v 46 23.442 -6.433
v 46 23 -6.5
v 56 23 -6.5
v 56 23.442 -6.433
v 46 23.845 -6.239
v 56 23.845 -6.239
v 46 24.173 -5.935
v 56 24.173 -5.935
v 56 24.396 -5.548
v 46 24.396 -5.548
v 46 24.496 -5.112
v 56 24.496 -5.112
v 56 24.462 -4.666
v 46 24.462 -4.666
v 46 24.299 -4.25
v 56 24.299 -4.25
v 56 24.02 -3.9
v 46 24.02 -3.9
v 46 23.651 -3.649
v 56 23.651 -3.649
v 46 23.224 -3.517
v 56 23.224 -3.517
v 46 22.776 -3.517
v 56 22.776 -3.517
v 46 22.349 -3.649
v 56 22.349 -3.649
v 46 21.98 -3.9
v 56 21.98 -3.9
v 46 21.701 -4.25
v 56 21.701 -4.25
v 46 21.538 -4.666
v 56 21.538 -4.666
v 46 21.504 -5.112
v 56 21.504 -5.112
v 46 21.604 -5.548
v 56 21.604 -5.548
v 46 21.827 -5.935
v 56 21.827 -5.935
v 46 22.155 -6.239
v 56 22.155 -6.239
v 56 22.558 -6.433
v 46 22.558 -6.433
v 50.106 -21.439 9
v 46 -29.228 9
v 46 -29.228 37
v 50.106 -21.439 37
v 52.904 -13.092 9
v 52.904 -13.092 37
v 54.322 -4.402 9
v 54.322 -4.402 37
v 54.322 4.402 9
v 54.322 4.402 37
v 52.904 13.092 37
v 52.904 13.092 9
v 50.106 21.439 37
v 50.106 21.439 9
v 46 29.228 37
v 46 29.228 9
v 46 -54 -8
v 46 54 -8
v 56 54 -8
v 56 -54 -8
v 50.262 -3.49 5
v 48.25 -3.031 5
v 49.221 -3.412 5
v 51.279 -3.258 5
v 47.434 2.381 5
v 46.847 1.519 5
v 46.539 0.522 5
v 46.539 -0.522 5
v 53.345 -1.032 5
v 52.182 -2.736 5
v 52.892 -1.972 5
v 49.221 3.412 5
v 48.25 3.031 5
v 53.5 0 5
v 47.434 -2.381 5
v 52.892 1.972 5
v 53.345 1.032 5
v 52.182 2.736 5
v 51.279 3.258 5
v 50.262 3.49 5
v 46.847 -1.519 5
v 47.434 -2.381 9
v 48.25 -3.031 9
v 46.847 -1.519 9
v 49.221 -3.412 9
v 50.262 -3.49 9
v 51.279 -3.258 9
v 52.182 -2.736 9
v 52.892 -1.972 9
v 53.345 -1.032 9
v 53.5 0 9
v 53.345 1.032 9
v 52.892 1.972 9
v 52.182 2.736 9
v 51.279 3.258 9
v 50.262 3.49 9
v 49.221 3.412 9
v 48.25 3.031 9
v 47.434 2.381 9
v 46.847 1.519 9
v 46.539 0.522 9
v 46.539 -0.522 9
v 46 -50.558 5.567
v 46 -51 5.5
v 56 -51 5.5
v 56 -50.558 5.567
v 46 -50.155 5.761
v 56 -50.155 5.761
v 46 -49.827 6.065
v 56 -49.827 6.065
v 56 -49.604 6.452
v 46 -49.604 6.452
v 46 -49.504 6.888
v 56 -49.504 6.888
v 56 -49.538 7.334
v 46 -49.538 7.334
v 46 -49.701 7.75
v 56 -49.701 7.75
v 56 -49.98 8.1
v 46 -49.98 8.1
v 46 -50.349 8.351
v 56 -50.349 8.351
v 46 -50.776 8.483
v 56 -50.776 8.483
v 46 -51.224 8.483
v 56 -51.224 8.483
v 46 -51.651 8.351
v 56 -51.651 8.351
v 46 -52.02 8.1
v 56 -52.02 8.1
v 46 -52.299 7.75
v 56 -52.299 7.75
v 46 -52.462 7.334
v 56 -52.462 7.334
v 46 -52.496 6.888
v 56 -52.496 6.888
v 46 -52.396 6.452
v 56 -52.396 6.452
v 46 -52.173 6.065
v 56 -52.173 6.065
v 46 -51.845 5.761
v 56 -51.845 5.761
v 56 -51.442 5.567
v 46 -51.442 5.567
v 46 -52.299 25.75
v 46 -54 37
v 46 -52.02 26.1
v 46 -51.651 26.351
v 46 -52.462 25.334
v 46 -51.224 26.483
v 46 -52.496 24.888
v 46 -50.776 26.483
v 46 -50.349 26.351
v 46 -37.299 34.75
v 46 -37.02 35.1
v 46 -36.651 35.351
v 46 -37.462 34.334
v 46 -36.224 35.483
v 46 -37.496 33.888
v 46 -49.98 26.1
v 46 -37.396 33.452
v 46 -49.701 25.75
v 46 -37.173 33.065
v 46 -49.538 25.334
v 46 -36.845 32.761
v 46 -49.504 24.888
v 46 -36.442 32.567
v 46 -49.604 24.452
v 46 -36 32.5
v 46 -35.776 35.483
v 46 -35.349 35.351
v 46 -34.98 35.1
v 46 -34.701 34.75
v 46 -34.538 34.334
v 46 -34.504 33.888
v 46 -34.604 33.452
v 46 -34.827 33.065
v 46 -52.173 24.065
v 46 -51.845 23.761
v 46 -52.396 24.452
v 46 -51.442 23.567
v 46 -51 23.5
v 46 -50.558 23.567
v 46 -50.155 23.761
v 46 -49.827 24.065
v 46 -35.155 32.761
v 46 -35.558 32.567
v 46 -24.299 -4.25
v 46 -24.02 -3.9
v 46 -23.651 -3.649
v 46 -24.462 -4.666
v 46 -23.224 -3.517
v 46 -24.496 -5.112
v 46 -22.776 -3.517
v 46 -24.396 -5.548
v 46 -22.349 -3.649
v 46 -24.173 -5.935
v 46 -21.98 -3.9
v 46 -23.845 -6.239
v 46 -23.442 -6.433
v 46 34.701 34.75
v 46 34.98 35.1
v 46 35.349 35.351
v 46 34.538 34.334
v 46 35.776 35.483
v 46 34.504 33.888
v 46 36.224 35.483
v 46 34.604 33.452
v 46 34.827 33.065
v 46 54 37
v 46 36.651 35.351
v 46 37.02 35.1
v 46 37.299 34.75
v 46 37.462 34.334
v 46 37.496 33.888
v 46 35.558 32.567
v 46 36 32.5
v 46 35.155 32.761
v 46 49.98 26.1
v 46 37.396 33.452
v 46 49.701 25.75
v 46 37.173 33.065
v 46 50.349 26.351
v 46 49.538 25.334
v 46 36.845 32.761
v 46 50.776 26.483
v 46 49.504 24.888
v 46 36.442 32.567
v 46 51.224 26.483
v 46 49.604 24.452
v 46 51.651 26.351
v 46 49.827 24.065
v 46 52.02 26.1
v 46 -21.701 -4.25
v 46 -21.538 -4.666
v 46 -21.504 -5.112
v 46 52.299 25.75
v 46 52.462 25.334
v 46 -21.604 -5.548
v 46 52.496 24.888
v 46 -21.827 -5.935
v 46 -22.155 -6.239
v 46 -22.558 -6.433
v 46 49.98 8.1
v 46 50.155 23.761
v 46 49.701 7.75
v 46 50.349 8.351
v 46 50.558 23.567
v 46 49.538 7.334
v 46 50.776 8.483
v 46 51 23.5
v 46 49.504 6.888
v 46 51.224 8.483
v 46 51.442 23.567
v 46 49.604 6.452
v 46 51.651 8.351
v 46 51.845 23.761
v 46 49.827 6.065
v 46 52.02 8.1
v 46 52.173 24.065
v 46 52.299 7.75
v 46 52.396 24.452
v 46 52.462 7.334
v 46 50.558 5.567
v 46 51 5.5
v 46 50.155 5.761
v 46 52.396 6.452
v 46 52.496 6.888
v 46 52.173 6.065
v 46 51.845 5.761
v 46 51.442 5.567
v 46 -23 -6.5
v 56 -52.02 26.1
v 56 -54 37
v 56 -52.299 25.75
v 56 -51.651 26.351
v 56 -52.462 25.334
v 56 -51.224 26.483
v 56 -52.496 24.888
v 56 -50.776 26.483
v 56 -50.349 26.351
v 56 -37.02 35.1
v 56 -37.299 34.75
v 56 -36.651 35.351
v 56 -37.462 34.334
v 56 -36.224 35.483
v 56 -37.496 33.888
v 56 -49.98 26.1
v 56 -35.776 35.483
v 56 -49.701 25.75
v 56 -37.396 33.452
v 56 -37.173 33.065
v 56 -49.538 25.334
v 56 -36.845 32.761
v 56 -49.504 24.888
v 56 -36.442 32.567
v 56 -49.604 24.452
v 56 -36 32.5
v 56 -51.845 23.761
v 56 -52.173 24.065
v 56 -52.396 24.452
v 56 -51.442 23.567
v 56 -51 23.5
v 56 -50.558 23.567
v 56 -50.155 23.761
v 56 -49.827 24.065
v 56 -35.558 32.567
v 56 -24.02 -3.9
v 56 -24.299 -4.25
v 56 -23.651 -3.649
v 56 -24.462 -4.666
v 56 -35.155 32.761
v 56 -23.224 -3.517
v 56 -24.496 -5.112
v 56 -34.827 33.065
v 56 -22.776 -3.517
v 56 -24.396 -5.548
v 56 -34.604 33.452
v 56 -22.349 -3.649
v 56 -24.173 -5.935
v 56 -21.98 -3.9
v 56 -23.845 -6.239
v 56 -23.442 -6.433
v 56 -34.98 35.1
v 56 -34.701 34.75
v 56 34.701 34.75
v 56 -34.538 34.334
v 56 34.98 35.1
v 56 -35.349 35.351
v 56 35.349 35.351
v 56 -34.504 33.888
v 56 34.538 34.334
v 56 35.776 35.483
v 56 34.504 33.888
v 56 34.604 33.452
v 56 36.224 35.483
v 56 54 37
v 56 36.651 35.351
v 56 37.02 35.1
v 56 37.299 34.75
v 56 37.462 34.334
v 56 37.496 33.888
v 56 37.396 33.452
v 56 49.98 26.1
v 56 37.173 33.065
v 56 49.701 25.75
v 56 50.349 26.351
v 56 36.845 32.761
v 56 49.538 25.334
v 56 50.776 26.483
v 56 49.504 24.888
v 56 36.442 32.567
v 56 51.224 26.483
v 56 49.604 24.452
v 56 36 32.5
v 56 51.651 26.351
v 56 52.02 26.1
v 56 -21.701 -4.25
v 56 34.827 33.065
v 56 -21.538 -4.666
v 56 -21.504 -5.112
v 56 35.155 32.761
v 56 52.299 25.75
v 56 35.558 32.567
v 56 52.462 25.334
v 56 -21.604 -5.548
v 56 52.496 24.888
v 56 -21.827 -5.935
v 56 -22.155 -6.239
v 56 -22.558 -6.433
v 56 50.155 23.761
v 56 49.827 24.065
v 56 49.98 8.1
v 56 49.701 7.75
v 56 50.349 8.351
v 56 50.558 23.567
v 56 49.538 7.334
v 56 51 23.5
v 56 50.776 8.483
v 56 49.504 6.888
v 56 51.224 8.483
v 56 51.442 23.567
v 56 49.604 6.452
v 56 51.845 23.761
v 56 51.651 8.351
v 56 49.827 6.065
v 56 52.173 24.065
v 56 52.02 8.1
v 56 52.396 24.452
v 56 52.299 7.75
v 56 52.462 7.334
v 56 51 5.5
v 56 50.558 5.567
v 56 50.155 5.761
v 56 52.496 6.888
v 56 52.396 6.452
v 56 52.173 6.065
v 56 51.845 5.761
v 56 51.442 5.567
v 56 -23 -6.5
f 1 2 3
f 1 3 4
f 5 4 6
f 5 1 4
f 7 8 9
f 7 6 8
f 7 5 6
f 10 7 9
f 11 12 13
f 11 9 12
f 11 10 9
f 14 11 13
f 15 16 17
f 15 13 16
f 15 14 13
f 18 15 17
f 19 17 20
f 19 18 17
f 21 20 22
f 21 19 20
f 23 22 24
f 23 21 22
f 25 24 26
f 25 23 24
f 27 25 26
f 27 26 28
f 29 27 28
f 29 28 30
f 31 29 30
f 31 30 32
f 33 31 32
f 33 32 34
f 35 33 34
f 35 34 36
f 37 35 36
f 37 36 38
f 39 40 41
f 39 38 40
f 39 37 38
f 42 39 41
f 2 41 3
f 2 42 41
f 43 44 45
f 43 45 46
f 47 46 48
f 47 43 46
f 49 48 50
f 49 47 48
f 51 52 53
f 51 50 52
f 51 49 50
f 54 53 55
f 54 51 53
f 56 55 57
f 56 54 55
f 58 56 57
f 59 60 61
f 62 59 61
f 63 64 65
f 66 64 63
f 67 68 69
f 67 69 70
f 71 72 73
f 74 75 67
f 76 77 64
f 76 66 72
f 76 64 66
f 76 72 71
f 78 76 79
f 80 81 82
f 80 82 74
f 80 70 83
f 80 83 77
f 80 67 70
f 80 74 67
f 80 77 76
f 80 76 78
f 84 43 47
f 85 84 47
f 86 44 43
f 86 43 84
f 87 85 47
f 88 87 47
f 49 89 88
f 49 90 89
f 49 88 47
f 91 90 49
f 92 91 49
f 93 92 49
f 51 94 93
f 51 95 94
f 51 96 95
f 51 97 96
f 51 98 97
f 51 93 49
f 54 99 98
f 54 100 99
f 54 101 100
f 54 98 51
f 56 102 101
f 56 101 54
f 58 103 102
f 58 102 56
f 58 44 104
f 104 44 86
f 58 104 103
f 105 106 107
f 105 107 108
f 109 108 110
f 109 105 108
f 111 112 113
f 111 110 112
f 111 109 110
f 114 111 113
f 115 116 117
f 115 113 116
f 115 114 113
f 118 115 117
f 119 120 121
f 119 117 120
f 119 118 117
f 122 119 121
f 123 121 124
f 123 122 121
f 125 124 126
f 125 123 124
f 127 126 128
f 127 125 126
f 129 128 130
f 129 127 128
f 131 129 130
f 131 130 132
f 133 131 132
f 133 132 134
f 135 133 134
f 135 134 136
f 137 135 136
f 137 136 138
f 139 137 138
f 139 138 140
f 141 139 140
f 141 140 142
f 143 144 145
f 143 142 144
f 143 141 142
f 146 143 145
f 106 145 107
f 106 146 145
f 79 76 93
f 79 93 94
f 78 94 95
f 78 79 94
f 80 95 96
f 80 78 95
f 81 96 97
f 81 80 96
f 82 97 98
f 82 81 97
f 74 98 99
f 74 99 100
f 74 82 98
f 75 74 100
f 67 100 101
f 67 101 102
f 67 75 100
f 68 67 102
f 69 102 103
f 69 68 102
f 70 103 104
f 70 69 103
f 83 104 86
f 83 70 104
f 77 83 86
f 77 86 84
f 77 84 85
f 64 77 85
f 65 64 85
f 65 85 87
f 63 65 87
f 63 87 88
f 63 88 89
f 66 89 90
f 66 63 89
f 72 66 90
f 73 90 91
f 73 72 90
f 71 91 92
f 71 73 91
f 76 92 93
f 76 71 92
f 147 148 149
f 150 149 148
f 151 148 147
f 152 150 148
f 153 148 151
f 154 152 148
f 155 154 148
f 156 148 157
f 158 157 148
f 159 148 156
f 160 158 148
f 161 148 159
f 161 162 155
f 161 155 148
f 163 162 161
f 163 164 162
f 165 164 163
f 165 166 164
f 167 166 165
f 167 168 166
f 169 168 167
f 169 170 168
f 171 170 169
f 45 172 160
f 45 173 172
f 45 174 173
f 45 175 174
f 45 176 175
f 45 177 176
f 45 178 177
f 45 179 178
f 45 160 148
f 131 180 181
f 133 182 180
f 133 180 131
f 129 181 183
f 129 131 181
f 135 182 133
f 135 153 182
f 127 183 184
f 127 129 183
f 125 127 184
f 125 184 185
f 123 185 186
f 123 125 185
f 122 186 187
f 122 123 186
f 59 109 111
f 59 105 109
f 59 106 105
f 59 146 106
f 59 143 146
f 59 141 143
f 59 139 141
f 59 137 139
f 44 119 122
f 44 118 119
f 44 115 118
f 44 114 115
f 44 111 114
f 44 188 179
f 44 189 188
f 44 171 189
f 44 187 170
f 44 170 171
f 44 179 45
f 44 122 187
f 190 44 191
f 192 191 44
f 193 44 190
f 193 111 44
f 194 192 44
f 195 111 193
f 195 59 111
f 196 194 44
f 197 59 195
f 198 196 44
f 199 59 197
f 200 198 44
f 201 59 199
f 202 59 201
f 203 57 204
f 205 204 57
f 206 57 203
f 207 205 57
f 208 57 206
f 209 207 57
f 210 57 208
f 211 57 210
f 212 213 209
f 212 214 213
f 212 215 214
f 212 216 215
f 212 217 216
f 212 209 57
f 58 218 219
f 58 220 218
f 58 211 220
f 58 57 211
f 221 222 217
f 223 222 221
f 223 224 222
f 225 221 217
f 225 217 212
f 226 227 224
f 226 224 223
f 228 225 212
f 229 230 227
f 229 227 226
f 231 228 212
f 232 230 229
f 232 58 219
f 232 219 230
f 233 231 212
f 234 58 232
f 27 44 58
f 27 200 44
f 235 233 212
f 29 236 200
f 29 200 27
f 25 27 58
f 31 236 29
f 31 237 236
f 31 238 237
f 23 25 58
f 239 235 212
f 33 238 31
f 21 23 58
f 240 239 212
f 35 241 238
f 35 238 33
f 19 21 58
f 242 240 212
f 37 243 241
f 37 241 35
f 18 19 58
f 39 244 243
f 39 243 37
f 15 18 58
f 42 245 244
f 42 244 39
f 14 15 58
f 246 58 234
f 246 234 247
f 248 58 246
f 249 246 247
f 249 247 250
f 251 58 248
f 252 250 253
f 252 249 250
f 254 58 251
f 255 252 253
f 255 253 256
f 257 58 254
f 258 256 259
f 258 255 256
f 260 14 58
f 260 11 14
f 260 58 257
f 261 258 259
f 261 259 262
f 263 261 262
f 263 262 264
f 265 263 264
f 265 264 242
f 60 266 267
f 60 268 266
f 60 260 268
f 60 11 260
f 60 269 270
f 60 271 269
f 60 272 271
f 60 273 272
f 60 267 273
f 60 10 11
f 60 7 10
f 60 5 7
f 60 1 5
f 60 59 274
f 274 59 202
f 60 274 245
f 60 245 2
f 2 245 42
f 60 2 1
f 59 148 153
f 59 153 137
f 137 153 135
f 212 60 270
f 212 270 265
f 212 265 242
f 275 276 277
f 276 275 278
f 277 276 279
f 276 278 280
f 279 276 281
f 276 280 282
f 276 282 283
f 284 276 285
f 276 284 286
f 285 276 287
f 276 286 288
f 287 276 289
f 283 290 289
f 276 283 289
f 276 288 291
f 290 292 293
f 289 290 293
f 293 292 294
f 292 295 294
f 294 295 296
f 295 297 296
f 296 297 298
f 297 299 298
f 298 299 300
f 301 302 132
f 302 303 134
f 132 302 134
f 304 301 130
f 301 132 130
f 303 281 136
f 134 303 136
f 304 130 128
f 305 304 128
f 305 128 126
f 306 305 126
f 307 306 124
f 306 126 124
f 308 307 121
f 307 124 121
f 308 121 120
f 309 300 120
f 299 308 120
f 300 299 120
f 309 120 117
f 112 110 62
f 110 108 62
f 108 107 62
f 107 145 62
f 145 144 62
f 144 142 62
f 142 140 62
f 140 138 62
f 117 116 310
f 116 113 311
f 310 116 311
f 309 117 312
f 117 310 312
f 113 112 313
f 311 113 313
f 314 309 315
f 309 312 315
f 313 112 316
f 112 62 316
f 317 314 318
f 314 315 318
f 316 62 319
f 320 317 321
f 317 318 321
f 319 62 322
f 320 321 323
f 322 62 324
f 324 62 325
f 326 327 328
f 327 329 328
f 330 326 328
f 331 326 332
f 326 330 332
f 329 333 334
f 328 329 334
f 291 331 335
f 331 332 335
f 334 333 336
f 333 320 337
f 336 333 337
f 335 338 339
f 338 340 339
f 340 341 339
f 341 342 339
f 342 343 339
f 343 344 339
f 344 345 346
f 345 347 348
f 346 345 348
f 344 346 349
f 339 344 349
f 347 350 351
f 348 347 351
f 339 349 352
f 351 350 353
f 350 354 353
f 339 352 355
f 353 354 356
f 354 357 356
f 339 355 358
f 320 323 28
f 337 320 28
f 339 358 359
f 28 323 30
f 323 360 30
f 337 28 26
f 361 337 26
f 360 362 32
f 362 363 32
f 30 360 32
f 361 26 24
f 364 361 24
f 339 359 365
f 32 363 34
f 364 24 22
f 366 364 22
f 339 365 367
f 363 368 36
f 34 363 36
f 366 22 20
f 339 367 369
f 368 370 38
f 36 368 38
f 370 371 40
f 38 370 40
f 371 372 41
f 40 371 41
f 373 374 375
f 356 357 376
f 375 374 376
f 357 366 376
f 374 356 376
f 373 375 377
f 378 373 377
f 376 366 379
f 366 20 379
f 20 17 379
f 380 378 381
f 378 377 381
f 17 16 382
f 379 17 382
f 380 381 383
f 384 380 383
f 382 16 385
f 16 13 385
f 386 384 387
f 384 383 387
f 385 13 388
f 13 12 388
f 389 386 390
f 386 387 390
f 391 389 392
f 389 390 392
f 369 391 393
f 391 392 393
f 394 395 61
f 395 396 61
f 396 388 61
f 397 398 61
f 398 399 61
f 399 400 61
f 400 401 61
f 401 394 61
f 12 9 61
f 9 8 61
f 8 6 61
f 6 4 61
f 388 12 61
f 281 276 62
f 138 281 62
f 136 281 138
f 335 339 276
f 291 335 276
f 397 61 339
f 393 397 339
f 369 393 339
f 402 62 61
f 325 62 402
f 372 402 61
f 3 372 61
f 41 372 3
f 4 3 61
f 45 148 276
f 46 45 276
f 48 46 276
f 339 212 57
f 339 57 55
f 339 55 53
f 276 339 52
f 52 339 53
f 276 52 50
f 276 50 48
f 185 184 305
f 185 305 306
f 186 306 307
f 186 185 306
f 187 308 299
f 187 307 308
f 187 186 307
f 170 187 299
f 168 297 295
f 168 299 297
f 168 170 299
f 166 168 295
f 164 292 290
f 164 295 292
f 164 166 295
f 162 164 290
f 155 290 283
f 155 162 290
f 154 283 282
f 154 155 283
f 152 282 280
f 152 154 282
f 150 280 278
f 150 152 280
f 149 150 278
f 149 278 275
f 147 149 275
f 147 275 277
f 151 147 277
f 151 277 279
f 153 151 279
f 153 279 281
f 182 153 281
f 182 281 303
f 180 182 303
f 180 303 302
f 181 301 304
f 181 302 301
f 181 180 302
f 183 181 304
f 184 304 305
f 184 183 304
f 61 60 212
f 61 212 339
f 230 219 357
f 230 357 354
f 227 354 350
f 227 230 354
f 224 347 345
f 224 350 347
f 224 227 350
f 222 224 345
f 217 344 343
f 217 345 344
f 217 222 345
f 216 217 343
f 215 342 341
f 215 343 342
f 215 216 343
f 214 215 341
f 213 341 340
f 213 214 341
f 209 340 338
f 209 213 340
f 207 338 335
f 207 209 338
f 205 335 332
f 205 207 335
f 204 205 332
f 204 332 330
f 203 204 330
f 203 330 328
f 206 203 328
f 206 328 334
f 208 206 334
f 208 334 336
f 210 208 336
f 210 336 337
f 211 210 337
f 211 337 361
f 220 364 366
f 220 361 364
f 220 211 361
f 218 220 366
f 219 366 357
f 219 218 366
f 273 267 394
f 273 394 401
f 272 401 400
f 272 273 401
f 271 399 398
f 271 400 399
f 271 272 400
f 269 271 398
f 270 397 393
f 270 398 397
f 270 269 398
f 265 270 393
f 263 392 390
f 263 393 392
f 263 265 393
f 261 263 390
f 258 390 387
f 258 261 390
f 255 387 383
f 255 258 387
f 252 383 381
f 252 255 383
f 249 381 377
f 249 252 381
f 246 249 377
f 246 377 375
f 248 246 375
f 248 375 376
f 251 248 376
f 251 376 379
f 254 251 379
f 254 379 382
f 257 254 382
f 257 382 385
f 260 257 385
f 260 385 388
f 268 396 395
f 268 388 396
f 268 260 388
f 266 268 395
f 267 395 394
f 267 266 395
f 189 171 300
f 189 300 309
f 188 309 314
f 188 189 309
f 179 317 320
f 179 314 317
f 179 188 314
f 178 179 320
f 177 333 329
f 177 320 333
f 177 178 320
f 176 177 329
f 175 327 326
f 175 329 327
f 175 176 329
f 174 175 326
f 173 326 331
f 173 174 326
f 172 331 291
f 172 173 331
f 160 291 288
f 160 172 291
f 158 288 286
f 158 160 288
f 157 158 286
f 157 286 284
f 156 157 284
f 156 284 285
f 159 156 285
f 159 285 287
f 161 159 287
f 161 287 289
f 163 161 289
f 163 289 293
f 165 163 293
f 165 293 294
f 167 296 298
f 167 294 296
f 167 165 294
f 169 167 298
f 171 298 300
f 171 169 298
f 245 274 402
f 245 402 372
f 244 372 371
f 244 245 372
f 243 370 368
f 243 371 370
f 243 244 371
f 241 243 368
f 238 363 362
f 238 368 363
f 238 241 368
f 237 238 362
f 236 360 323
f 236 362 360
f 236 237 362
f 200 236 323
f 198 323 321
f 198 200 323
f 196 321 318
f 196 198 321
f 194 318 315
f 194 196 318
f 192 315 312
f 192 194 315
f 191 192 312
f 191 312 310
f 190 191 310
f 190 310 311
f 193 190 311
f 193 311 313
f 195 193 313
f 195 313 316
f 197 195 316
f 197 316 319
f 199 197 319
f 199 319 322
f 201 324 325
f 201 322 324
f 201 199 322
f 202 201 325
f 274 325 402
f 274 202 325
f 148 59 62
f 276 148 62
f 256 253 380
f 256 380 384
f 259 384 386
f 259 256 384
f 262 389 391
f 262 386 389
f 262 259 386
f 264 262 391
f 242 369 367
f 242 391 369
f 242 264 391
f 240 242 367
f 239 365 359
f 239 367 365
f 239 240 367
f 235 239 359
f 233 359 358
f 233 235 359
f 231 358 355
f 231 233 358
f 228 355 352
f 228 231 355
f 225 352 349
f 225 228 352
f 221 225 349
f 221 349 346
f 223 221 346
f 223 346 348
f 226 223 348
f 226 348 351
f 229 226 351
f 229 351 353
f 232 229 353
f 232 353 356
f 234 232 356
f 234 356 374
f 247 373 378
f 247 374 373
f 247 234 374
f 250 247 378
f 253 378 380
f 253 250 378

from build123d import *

# Parameters (mm, degrees)
CYLINDER485_R     = 3.5
CYLINDER485_DEPTH = 4
CYLINDER484_R     = 54.5
CYLINDER484_DEPTH = 28
CYLINDER473_R     = 1.5
CYLINDER473_DEPTH = 100
CYLINDER471_R     = 1.5
CYLINDER471_DEPTH = 100
CYLINDER464_R     = 1.5
CYLINDER464_DEPTH = 100
CYLINDER466_R     = 1.5
CYLINDER466_DEPTH = 100
CYLINDER460_R     = 1.5
CYLINDER460_DEPTH = 100
CYLINDER463_R     = 1.5
CYLINDER463_DEPTH = 100
CYLINDER468_R     = 1.5
CYLINDER468_DEPTH = 100
CYLINDER470_R     = 1.5
CYLINDER470_DEPTH = 100
BOX213_W          = 10
BOX213_H          = 108
BOX213_DEPTH      = 45


with BuildPart() as v_lec485:
    # Cylinder485 → Cylinder485 (new body)
    with BuildSketch(Plane(origin=(50, 0, 5), x_dir=(1, 0, 0), z_dir=(0, 0, 1))):
        Circle(CYLINDER485_R)
    extrude(amount=CYLINDER485_DEPTH)


with BuildPart() as v_lec484:
    # Cylinder484 → Cylinder484 (new body)
    with BuildSketch(Plane.XY.offset(9)):
        Circle(CYLINDER484_R)
    extrude(amount=CYLINDER484_DEPTH)


with BuildPart() as v_lec473:
    # Cylinder473 → Cylinder473 (new body)
    with BuildSketch(Plane(origin=(24, -51, 25), x_dir=(0, 0, -1), z_dir=(1, 0, 0))):
        Circle(CYLINDER473_R)
    extrude(amount=CYLINDER473_DEPTH)


with BuildPart() as v_lec471:
    # Cylinder471 → Cylinder471 (new body)
    with BuildSketch(Plane(origin=(24, 36, 34), x_dir=(0, 0, -1), z_dir=(1, 0, 0))):
        Circle(CYLINDER471_R)
    extrude(amount=CYLINDER471_DEPTH)


with BuildPart() as v_lec464:
    # Cylinder464 → Cylinder464 (new body)
    with BuildSketch(Plane(origin=(24, -36, 34), x_dir=(0, 0, -1), z_dir=(1, 0, 0))):
        Circle(CYLINDER464_R)
    extrude(amount=CYLINDER464_DEPTH)


with BuildPart() as v_lec466:
    # Cylinder466 → Cylinder466 (new body)
    with BuildSketch(Plane(origin=(24, -23, -5), x_dir=(0, 0, -1), z_dir=(1, 0, 0))):
        Circle(CYLINDER466_R)
    extrude(amount=CYLINDER466_DEPTH)


with BuildPart() as v_lec460:
    # Cylinder460 → Cylinder460 (new body)
    with BuildSketch(Plane(origin=(24, 51, 7), x_dir=(0, 0, -1), z_dir=(1, 0, 0))):
        Circle(CYLINDER460_R)
    extrude(amount=CYLINDER460_DEPTH)


with BuildPart() as v_lec463:
    # Cylinder463 → Cylinder463 (new body)
    with BuildSketch(Plane(origin=(24, 23, -5), x_dir=(0, 0, -1), z_dir=(1, 0, 0))):
        Circle(CYLINDER463_R)
    extrude(amount=CYLINDER463_DEPTH)


with BuildPart() as v_lec468:
    # Cylinder468 → Cylinder468 (new body)
    with BuildSketch(Plane(origin=(24, -51, 7), x_dir=(0, 0, -1), z_dir=(1, 0, 0))):
        Circle(CYLINDER468_R)
    extrude(amount=CYLINDER468_DEPTH)


with BuildPart() as compound594:
    # Cylinder470 → Cylinder470 (new body)
    with BuildSketch(Plane(origin=(24, 51, 25), x_dir=(0, 0, -1), z_dir=(1, 0, 0))):
        Circle(CYLINDER470_R)
    extrude(amount=CYLINDER470_DEPTH)

    # Compound594: union Válec473, Válec471, Válec464, Válec466, Válec460, Válec463, Válec468
    add(v_lec473.part)
    add(v_lec471.part)
    add(v_lec464.part)
    add(v_lec466.part)
    add(v_lec460.part)
    add(v_lec463.part)
    add(v_lec468.part)


with BuildPart() as cut371:
    # Box213 → Box213 (new body)
    with BuildSketch(Plane(origin=(46, -54, -8), x_dir=(1, 0, 0), z_dir=(0, 0, 1))):
        with Locations((5, 54)):
            Rectangle(BOX213_W, BOX213_H)
    extrude(amount=BOX213_DEPTH)

    # Cut374: cut Compound594
    add(compound594.part, mode=Mode.SUBTRACT)

    # Cut375: cut Válec484
    add(v_lec484.part, mode=Mode.SUBTRACT)

    # Cut371: cut Válec485
    add(v_lec485.part, mode=Mode.SUBTRACT)


solid = cut371.part
